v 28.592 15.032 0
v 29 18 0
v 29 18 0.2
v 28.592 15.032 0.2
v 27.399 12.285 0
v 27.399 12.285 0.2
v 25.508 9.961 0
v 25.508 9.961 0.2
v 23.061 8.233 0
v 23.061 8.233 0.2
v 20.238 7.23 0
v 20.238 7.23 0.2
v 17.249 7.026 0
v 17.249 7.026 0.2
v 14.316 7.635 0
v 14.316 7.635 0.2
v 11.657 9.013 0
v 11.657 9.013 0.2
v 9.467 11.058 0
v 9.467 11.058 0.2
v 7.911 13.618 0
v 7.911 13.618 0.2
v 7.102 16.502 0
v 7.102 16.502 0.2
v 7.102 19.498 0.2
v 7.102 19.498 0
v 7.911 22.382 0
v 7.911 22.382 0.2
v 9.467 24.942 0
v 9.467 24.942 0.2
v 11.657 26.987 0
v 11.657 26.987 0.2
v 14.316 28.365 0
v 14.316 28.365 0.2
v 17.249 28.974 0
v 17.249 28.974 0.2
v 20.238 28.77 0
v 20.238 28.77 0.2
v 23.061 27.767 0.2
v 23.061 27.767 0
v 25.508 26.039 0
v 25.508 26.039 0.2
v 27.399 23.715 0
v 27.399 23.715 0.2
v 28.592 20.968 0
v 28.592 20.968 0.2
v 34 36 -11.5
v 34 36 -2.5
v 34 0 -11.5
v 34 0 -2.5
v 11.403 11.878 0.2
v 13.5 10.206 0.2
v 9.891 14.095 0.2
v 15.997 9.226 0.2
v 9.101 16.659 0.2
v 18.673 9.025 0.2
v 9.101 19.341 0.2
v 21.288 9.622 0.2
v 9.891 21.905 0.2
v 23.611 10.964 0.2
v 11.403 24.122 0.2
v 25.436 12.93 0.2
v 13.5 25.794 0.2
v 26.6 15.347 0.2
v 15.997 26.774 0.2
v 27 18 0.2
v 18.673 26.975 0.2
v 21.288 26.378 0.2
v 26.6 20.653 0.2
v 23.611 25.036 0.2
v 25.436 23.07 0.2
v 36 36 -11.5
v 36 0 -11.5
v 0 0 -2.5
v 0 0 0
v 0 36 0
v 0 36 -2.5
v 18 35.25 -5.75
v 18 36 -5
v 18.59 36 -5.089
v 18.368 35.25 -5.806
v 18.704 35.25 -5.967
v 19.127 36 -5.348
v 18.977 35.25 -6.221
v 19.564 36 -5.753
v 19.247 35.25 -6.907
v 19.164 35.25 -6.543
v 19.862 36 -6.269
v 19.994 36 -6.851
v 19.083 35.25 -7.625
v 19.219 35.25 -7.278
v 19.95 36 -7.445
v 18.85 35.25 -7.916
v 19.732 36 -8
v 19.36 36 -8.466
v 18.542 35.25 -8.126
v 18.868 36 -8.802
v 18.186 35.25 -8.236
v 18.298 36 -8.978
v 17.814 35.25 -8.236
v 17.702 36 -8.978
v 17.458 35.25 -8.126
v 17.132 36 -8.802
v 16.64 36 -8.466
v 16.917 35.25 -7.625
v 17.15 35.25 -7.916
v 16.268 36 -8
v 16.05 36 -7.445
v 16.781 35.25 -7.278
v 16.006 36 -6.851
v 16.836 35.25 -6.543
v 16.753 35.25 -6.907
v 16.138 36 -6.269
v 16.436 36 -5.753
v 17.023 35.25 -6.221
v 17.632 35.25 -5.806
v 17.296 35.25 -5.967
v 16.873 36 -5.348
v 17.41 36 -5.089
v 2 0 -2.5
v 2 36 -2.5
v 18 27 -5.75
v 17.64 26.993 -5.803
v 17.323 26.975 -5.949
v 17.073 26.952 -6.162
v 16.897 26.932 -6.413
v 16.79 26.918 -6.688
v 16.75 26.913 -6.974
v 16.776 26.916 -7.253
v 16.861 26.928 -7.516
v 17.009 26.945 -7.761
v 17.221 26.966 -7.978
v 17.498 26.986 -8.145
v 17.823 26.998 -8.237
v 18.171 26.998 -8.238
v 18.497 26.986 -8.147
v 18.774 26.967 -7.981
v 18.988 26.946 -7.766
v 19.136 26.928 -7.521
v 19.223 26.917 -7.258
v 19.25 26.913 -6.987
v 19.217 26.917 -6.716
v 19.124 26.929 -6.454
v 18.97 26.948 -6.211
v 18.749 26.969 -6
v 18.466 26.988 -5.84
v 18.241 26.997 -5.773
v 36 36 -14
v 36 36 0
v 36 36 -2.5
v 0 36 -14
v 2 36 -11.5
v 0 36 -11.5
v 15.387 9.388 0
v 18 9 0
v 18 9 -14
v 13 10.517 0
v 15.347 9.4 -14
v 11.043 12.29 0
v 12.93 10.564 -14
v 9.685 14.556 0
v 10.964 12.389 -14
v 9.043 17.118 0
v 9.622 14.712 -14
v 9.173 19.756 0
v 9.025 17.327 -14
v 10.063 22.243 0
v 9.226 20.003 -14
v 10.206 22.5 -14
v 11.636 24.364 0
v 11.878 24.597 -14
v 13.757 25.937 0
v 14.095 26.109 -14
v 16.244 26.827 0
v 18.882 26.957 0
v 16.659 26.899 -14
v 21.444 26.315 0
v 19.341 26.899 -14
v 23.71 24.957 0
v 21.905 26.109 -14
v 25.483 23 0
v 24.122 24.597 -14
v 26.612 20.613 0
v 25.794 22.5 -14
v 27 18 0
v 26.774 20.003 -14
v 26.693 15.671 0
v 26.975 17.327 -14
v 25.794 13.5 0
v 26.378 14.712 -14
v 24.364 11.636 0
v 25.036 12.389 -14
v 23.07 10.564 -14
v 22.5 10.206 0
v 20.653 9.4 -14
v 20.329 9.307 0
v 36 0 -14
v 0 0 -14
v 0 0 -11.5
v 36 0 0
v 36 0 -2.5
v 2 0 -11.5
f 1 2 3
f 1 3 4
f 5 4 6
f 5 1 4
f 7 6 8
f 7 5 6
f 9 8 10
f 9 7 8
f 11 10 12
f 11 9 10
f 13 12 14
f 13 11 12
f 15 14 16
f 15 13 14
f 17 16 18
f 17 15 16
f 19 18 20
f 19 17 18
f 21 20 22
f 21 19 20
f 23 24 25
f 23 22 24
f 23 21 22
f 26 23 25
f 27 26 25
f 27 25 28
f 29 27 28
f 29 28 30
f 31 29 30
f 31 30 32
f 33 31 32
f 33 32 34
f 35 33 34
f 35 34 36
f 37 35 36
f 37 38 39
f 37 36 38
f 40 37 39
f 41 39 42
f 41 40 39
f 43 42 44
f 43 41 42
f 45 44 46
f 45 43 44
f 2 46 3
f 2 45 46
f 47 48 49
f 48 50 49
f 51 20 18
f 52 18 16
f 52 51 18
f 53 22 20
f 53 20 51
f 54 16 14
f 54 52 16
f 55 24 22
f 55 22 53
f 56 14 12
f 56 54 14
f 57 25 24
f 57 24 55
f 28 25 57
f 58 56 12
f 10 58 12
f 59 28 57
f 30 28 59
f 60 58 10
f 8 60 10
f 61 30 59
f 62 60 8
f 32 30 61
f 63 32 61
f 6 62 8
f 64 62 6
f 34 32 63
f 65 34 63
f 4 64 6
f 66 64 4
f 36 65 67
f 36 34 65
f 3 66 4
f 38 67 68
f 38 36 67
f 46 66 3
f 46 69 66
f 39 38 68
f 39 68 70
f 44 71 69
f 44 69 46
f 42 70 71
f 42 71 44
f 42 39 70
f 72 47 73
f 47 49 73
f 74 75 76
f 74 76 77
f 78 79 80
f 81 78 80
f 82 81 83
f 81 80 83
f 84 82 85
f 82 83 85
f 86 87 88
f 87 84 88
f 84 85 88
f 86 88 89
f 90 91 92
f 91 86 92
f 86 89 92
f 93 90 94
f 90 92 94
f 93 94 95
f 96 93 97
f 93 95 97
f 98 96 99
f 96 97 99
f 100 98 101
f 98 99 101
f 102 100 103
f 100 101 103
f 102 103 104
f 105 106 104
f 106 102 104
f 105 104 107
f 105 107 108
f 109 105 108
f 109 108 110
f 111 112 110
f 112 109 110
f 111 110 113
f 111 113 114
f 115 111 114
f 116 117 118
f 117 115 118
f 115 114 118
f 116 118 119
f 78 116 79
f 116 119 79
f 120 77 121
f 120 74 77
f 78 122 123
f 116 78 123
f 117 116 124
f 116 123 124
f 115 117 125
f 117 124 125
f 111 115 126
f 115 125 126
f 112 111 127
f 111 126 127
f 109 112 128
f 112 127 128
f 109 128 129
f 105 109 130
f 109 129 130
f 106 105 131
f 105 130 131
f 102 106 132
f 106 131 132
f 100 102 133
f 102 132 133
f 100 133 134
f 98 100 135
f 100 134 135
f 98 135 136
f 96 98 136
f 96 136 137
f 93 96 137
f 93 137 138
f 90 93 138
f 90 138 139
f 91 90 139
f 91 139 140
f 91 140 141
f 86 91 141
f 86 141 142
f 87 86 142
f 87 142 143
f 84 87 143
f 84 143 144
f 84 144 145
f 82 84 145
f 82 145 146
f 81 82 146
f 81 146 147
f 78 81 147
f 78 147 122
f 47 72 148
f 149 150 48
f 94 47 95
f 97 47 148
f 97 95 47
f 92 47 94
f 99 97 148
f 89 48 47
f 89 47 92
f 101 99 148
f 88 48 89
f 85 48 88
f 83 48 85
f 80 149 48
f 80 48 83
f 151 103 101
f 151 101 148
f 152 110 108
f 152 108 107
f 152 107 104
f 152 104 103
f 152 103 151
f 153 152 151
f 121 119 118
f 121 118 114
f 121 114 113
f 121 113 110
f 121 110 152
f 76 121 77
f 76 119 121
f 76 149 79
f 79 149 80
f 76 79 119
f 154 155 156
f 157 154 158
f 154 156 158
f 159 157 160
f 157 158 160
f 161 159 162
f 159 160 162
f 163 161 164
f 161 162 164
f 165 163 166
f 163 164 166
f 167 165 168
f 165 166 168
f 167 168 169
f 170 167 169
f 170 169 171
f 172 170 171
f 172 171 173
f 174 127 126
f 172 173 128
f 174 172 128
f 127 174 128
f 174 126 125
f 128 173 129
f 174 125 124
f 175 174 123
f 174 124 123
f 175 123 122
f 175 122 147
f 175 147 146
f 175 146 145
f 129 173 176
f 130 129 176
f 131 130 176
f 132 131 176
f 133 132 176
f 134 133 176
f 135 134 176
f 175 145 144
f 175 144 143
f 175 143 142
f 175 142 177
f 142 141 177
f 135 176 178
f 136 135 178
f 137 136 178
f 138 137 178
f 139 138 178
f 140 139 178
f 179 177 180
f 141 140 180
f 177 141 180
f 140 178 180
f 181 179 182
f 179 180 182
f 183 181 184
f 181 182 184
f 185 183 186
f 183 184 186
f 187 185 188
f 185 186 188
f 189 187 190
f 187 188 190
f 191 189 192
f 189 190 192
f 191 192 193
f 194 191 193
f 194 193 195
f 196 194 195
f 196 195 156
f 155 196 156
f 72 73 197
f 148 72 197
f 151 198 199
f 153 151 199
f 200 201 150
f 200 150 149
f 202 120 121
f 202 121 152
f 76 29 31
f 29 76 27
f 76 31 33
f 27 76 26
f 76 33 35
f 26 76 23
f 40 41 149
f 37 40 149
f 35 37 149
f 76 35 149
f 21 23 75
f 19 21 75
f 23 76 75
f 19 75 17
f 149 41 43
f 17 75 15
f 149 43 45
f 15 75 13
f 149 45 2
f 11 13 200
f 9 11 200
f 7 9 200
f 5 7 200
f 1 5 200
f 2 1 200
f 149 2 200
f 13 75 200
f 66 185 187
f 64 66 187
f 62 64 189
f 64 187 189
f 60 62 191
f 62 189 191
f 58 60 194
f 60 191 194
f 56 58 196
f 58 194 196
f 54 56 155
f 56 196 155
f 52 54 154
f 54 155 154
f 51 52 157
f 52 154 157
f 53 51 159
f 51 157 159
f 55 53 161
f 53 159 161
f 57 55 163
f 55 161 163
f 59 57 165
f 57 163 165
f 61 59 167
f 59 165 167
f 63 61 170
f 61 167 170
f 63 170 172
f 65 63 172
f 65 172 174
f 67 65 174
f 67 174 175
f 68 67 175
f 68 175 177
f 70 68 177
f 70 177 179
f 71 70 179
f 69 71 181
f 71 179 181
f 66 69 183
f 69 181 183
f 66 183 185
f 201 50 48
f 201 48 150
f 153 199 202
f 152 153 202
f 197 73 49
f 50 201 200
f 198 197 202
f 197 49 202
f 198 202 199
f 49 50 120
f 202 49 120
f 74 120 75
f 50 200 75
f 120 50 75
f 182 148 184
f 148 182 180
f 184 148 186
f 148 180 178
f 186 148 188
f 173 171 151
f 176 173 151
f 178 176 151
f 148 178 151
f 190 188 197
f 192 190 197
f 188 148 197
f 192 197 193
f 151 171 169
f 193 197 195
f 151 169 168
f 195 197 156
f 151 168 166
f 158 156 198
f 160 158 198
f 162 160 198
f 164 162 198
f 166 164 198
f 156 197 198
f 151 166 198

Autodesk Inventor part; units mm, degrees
ref_plane "YZ Plane" through (0, 0, 0) normal (1, 0, 0) x (0, 1, 0)
ref_plane "XZ Plane" through (0, 0, 0) normal (0, 1, 0) x (-1, 0, 0)
ref_plane "XY Plane" through (0, 0, 0) normal (0, 0, 1) x (1, 0, 0)
sketch "Sketch1" plane through (0, 0, 0) normal (0, 1, 0) x (-1, 0, 0)
  line L0 (0, 0) -> (-36, 0)
  line L1 (-36, -14) -> (0, -14)
  line L2 (0, 0) -> (0, -2.5)
  line L3 (-2, -2.5) -> (-2, -11.5)
  line L4 (-34, -2.5) -> (-34, -11.5)
  line L5 (0.1666, -2.5) -> (-2, -2.5)
  line L6 (0, -14) -> (0, -11.5)
  line L7 (0, -11.5) -> (-2, -11.5)
  line L8 (-34, -11.5) -> (-36, -11.5)
  line L9 (-36, -11.5) -> (-36, -14)
  line L10 (-34, -2.5) -> (-36, -2.5)
  line L11 (-36, -2.5) -> (-36, 0)
  dimension "d1" = 14
  dimension "d2" = 36
  dimension "d3" = 2.5
  dimension "d4" = 9
  dimension "d5" = 9
  dimension "d6" = 32
  dimension "d8" = 9
  dimension "d9" = 36
extrude "Extrusion1" add sketch "Sketch1" along normal blind 36
sketch "Sketch2" plane through (0, 36, 0) normal (0, 1, 0) x (1, 0, 0)
  circle A0 centre (18, 7) radius 1.25
  line L0 (34, 2.5) -> (34, 11.5) projected
  line L1 (0, 0) -> (36, 0) projected
  dimension "d12" = 2.5
  dimension "d13" = 16
  dimension "d14" = 7
sketch "Sketch3" plane through (0, 0, 0) normal (0, 0, 1) x (1, 0, 0)
  circle A0 centre (18, 18) radius 11
  circle A1 centre (18, 18) radius 9
  line L0 (0, 0) -> (36, 0) projected
  line L1 (0, 0) -> (0, 36) projected
  dimension "d15" = 22
  dimension "d16" = 18
  dimension "d17" = 18
  dimension "d18" = 18
hole "Hole1" at (18, 18, 0) direction (0, 0, -1) diameter 18 end through all
extrude "Extrusion2" add sketch "Sketch3" along normal blind 0.2
hole "Hole2" at (18, 36, -7) direction (0, -1, 0) diameter 2.5 end up to surface countersink diameter 4 countersink angle 90
properties part number "HUDSON 1-08 AXLE BLOCK"
